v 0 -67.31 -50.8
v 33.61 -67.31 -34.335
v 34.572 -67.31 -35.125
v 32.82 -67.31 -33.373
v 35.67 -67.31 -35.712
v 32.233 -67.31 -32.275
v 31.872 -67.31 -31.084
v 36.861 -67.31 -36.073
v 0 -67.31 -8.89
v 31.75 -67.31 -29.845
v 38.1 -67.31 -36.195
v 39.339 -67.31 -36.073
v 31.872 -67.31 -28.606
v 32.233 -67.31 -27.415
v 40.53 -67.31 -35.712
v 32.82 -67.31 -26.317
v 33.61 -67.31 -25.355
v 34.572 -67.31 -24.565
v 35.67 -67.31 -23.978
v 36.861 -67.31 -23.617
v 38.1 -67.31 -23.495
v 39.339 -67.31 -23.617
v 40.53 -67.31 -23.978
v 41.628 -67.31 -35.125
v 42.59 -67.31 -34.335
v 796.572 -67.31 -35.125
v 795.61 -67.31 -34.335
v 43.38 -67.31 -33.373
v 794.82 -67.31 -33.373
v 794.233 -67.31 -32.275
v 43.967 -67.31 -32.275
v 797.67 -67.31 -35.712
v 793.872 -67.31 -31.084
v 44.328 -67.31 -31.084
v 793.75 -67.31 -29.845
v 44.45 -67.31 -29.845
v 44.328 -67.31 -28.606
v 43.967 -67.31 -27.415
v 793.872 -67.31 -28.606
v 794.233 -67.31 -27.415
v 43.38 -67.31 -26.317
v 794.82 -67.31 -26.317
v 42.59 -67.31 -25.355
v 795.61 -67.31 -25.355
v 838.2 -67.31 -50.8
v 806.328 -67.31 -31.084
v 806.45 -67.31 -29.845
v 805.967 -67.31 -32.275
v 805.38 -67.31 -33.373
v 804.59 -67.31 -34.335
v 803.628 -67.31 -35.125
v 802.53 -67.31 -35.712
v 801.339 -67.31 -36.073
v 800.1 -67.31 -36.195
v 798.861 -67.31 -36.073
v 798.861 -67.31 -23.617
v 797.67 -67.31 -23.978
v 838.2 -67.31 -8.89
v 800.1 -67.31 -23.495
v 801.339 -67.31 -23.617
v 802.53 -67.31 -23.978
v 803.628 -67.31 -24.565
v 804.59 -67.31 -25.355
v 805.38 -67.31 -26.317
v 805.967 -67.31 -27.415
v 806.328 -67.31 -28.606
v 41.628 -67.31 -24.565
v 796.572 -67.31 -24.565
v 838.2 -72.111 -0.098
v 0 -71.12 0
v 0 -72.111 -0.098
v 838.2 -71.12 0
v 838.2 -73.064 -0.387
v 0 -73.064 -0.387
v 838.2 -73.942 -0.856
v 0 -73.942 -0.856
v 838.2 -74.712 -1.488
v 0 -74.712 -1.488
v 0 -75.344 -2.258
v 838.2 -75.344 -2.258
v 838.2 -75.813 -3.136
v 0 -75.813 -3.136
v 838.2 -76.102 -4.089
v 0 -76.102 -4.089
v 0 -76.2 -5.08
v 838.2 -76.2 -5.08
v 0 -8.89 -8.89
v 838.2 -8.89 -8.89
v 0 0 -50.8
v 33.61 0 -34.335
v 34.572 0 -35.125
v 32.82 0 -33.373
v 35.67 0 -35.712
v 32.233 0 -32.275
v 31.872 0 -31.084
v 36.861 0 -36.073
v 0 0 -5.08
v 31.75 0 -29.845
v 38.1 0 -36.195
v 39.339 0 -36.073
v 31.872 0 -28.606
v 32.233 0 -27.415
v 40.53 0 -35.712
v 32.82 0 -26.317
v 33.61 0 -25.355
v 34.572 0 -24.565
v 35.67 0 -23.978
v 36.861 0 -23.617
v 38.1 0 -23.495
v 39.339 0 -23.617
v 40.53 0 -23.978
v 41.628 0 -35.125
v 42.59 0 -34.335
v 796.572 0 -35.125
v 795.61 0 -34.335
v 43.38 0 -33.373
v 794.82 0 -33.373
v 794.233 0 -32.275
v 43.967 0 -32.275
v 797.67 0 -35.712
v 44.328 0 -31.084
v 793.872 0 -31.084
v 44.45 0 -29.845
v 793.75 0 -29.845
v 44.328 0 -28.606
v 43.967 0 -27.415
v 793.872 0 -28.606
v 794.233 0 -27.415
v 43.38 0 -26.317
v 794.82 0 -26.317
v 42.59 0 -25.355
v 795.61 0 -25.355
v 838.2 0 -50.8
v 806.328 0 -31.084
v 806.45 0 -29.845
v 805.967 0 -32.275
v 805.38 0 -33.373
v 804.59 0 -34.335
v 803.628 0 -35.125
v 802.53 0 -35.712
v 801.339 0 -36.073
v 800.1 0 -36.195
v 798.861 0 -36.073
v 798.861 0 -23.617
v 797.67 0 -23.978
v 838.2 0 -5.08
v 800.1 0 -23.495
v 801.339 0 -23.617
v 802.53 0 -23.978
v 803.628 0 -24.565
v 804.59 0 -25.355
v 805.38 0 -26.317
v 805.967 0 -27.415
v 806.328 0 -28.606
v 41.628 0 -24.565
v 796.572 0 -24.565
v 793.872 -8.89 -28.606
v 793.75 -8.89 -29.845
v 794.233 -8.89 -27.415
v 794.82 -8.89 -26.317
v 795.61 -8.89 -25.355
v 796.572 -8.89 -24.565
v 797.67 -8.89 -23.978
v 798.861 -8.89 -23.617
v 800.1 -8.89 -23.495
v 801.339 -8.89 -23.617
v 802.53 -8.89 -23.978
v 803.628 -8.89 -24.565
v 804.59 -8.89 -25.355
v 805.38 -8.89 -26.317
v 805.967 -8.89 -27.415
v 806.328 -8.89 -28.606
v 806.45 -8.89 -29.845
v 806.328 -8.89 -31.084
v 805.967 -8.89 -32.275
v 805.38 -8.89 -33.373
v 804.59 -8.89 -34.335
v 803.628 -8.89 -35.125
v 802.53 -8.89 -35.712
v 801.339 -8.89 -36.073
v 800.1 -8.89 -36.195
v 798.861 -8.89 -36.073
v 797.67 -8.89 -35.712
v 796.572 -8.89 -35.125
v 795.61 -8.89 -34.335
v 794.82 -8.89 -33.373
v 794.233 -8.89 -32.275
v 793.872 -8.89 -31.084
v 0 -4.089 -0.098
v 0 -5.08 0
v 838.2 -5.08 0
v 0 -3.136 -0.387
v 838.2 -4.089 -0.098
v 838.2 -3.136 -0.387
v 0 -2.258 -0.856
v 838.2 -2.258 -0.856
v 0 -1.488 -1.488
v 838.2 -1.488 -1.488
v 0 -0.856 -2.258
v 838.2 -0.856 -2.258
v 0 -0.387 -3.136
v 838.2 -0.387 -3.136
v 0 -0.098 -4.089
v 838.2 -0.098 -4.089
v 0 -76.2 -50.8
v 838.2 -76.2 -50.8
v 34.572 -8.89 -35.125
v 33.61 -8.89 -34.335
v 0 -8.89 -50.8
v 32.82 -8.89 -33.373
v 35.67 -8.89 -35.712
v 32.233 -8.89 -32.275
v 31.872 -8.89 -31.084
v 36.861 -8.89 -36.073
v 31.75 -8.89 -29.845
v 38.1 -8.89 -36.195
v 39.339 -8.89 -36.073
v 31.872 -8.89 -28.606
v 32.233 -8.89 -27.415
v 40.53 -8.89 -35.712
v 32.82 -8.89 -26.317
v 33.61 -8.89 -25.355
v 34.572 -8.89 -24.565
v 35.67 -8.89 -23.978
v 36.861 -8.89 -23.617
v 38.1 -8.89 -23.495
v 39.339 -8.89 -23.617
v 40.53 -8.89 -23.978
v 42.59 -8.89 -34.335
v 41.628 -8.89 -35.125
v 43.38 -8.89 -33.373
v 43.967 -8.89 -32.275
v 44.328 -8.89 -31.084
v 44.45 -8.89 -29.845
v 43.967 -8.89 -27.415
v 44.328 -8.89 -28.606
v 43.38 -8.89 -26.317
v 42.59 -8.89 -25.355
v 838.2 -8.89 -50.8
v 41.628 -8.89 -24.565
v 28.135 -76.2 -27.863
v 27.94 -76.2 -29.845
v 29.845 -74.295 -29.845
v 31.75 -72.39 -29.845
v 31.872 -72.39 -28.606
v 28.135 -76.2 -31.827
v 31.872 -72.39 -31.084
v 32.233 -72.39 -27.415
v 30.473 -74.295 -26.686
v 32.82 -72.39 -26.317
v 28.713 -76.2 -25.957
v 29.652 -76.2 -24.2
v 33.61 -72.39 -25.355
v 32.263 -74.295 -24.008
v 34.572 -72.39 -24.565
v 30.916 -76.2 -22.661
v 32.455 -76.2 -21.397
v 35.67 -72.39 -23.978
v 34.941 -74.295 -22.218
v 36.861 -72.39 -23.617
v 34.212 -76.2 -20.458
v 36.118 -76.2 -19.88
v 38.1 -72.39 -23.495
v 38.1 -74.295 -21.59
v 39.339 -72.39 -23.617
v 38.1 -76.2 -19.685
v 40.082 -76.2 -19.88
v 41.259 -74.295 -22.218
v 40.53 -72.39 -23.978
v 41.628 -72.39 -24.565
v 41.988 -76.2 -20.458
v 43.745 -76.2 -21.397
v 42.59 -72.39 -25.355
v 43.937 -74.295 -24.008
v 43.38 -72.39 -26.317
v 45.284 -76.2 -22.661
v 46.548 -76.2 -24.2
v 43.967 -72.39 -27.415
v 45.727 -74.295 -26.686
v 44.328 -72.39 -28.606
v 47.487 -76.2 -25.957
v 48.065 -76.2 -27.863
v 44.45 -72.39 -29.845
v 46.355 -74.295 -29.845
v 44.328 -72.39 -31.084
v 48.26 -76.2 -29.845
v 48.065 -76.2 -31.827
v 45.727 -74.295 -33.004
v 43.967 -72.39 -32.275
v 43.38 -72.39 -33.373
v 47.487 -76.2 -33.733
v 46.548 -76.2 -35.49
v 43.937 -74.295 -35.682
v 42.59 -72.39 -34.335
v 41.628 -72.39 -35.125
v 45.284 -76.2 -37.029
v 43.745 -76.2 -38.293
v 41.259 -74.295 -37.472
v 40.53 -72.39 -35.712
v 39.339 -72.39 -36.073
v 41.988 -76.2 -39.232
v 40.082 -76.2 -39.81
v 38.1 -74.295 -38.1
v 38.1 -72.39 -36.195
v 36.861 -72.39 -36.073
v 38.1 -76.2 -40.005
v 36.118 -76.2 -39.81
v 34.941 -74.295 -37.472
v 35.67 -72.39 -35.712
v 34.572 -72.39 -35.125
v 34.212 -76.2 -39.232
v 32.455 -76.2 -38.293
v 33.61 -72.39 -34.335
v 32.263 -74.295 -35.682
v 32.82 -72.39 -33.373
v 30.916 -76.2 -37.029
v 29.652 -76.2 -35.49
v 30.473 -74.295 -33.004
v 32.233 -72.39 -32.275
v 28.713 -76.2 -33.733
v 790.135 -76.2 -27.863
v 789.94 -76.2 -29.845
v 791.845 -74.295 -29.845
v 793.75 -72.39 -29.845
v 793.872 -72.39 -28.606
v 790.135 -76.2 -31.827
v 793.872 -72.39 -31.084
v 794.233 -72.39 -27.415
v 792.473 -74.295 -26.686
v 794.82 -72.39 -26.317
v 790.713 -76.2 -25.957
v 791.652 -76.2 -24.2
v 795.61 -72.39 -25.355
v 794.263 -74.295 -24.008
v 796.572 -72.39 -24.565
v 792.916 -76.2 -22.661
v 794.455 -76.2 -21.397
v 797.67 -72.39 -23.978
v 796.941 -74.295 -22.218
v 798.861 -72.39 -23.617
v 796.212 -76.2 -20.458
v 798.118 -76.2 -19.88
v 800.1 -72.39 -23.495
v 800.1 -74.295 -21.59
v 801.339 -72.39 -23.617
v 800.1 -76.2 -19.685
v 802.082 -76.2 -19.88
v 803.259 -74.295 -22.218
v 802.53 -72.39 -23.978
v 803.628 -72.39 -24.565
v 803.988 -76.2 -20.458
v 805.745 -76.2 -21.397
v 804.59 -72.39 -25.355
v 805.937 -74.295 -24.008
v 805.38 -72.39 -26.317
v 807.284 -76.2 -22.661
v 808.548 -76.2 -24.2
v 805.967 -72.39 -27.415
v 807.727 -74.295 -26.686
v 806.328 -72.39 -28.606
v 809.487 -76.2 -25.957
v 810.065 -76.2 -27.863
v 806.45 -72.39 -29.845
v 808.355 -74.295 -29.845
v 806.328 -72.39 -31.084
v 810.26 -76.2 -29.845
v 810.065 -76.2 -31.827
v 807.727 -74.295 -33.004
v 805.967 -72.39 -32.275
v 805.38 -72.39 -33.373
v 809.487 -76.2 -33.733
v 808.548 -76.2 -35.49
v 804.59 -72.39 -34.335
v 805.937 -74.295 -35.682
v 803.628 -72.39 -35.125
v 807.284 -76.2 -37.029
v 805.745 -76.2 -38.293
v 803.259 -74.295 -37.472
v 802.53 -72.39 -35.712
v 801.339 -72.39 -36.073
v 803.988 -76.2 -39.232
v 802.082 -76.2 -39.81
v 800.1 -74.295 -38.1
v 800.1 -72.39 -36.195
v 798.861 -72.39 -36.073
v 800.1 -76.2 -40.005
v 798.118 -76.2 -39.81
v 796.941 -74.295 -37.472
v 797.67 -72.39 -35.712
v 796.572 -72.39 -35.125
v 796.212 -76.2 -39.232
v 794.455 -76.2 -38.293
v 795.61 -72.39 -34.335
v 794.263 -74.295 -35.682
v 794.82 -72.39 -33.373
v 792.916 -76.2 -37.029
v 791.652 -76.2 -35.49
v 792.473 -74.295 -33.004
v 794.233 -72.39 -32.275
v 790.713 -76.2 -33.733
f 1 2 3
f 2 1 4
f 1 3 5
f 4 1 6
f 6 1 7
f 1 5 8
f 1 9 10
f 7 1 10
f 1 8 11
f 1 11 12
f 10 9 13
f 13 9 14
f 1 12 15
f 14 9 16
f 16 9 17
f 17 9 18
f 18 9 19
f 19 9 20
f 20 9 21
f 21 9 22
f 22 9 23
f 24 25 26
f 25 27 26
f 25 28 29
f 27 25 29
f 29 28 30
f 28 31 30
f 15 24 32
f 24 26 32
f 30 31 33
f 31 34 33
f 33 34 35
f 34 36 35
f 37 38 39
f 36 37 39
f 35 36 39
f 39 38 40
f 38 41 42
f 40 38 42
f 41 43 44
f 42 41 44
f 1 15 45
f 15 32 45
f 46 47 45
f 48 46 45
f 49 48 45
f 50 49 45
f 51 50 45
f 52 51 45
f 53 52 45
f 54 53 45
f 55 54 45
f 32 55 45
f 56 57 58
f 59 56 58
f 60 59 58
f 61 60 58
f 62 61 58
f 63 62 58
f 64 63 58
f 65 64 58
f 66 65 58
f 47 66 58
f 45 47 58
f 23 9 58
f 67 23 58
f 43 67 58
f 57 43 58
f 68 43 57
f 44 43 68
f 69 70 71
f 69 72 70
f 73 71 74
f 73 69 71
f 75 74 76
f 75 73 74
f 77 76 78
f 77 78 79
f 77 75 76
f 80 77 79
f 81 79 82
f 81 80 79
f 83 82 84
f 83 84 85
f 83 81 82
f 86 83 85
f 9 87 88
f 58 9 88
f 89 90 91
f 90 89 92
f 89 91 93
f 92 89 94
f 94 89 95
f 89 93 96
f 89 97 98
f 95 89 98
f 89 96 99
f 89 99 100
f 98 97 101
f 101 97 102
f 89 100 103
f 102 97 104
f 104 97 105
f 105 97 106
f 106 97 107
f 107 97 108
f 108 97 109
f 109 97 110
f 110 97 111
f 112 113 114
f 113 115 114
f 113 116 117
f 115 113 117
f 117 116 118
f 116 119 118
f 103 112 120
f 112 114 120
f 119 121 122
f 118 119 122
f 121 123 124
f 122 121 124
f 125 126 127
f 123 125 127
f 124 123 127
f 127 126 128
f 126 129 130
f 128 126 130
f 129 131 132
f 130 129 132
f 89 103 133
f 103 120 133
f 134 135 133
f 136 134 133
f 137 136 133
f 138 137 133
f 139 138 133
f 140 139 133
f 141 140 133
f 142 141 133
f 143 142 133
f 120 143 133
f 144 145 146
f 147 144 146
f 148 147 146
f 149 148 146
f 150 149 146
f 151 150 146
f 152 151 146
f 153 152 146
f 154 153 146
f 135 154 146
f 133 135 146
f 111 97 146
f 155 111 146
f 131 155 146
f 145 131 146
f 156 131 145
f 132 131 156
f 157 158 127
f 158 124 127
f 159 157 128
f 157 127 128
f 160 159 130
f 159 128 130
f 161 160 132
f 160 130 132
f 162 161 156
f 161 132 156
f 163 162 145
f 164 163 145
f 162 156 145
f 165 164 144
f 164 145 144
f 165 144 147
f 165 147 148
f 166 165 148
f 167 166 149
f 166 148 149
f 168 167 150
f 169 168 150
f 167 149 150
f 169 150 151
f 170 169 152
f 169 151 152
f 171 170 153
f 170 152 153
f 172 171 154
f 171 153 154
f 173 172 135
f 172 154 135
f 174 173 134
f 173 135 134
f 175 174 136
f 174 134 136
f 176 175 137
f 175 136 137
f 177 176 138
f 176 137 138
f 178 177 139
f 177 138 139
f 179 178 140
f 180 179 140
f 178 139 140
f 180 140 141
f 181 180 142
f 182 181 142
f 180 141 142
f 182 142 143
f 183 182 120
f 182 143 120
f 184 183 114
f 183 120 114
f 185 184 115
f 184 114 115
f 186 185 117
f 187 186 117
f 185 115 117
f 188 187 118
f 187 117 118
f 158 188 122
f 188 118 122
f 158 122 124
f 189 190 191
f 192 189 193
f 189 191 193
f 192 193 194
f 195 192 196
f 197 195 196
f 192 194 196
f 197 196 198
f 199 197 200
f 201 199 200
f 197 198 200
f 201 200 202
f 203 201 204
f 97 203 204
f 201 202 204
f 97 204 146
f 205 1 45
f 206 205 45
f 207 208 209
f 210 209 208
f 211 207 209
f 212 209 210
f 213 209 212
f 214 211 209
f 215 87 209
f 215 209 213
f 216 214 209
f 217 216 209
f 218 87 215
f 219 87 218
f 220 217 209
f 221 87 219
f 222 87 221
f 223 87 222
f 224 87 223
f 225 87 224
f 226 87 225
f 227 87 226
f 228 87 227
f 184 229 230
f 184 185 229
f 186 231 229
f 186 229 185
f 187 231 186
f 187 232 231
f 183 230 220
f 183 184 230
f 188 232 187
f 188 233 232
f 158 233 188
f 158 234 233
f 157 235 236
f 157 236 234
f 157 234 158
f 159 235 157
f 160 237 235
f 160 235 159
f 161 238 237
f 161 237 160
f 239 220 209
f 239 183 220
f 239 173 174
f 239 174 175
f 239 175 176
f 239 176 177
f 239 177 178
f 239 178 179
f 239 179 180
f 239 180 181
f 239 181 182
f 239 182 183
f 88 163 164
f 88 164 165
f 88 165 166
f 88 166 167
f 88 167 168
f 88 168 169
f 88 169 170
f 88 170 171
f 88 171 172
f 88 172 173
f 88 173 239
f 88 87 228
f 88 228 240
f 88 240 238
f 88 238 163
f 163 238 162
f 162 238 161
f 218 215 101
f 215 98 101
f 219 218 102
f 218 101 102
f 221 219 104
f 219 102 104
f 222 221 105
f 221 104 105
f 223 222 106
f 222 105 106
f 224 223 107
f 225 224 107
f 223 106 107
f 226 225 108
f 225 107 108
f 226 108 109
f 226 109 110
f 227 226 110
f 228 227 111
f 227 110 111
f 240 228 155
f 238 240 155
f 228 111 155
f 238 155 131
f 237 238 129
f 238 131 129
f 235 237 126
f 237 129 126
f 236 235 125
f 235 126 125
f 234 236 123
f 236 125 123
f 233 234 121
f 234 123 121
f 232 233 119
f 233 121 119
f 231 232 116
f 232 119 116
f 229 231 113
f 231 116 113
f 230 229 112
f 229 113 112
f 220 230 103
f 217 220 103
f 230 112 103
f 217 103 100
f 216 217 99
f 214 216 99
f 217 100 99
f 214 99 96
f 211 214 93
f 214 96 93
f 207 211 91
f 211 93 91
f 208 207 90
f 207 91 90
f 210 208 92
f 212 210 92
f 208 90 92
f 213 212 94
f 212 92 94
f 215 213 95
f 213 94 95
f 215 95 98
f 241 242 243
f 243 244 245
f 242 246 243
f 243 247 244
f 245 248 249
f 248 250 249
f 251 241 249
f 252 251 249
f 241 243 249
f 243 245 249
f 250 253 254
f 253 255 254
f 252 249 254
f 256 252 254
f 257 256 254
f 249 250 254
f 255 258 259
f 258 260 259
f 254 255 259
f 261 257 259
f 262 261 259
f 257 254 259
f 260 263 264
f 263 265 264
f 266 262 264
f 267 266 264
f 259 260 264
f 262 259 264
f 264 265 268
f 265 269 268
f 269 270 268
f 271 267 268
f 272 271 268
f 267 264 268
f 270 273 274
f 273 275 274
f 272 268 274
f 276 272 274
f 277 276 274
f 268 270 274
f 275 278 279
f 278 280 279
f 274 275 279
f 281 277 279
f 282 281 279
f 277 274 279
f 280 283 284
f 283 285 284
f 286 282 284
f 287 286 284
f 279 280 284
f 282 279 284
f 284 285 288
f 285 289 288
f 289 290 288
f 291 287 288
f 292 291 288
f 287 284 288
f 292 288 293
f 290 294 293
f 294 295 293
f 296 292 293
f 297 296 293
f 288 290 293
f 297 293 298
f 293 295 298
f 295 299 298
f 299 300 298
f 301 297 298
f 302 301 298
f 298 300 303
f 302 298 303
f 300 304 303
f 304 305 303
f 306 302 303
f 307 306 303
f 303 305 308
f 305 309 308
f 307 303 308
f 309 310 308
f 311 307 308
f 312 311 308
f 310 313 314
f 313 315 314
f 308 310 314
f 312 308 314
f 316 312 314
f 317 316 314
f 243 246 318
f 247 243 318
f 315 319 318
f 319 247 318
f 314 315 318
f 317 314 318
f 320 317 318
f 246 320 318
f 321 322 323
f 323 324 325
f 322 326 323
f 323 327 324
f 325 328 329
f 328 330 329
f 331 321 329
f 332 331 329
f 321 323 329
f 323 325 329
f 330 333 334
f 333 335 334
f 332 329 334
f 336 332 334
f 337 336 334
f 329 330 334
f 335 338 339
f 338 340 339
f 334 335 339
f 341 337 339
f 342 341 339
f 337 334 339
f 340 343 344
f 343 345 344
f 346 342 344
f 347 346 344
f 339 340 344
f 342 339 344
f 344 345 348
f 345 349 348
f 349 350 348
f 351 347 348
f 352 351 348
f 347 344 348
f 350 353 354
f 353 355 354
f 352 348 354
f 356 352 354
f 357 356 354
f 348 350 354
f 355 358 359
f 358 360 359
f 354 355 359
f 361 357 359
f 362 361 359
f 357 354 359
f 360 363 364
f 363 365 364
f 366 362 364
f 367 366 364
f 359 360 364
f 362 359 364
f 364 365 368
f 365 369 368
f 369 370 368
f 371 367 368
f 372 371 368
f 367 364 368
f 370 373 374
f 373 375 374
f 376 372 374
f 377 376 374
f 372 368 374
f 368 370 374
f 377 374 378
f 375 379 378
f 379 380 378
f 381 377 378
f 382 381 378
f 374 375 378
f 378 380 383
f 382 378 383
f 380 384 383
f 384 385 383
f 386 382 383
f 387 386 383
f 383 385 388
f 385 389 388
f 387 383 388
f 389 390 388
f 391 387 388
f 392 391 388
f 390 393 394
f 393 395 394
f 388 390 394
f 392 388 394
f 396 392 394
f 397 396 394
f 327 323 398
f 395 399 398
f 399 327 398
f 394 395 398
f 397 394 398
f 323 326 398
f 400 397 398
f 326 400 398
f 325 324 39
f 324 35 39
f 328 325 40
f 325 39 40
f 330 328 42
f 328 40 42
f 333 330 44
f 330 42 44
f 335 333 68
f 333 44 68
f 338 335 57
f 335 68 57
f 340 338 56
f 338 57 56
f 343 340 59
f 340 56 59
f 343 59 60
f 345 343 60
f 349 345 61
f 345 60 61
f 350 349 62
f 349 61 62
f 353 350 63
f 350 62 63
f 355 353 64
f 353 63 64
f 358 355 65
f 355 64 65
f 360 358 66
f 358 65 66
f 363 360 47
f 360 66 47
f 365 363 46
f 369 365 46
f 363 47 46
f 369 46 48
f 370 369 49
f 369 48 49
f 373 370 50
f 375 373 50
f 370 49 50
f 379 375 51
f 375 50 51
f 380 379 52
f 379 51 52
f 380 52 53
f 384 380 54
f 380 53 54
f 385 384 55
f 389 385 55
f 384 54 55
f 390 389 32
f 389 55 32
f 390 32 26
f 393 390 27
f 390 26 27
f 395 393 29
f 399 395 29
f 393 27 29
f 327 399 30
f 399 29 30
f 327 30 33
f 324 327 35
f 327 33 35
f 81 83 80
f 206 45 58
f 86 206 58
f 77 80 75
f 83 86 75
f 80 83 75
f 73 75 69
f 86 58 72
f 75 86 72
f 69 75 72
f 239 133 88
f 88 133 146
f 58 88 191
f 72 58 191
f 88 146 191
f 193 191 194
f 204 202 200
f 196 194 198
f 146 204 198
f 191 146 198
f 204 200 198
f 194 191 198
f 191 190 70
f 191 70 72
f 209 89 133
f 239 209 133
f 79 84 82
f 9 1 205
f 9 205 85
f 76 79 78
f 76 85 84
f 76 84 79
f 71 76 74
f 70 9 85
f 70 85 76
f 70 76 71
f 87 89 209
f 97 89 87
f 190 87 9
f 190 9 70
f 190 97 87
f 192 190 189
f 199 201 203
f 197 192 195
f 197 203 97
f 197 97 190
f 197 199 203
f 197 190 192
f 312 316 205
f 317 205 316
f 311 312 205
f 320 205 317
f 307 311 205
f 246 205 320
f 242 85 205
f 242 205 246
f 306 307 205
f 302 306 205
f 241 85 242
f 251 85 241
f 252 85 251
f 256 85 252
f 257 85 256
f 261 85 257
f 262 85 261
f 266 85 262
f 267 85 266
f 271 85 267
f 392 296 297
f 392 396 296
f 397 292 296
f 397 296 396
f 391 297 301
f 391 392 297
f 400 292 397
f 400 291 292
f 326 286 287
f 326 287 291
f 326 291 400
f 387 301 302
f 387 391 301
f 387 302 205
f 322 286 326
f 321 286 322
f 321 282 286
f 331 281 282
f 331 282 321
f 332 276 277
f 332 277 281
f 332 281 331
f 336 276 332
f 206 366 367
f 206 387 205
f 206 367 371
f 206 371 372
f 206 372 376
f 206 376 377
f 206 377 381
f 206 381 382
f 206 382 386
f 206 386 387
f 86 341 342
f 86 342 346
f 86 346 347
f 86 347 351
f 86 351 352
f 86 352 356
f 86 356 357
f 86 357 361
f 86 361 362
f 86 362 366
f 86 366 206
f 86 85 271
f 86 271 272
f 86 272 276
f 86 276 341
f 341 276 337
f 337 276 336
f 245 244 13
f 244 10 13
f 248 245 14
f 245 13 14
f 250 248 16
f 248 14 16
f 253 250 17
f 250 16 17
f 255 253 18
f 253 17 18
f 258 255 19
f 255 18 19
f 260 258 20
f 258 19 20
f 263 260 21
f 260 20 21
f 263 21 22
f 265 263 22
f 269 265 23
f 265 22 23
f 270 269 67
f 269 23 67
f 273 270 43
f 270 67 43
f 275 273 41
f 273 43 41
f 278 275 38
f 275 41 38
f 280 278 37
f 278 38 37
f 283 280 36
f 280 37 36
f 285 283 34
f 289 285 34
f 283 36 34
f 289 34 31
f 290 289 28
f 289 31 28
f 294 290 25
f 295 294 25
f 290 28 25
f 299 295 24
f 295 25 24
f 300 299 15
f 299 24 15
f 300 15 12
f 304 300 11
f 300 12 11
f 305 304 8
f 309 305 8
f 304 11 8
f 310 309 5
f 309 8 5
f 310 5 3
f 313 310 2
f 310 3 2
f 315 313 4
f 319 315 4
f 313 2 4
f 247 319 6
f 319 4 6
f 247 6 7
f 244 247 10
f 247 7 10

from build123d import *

# Parameters (mm, degrees)
F0_W           = 838.2
F0_H           = 50.8
F1_DEPTH       = 76.2
F3_T           = -8.89
F4_D           = 12.7
F4_CSINK_D     = 20.32
F4_CSINK_ANGLE = 90
F5_R           = 5.08


with BuildPart() as f1:
    # F0 (on Front) → F1 (new body)
    with BuildSketch(Plane.XZ):
        with Locations((419.1, -25.4)):
            Rectangle(F0_W, F0_H)
    extrude(amount=F1_DEPTH)

    # F3
    f3_openings = [f1.faces().sort_by_distance(p)[0] for p in [
        (838.2, -38.1, -25.4),
        (419.1, -38.1, -50.8),
        (0, -38.1, -25.4),
    ]]
    offset(amount=F3_T, openings=f3_openings)

    # F4 (through all)
    with Locations(Plane.XZ.offset(76.2)):
        with Locations((38.1, -29.845), (800.1, -29.845)):
            CounterSinkHole(F4_D / 2, F4_CSINK_D / 2, counter_sink_angle=F4_CSINK_ANGLE)

    # F5
    f5_edges = [f1.edges().sort_by_distance(p)[0] for p in [
        (419.1, -76.2, 0),
        (419.1, 0, 0),
    ]]
    fillet(f5_edges, radius=F5_R)


solid = f1.part
